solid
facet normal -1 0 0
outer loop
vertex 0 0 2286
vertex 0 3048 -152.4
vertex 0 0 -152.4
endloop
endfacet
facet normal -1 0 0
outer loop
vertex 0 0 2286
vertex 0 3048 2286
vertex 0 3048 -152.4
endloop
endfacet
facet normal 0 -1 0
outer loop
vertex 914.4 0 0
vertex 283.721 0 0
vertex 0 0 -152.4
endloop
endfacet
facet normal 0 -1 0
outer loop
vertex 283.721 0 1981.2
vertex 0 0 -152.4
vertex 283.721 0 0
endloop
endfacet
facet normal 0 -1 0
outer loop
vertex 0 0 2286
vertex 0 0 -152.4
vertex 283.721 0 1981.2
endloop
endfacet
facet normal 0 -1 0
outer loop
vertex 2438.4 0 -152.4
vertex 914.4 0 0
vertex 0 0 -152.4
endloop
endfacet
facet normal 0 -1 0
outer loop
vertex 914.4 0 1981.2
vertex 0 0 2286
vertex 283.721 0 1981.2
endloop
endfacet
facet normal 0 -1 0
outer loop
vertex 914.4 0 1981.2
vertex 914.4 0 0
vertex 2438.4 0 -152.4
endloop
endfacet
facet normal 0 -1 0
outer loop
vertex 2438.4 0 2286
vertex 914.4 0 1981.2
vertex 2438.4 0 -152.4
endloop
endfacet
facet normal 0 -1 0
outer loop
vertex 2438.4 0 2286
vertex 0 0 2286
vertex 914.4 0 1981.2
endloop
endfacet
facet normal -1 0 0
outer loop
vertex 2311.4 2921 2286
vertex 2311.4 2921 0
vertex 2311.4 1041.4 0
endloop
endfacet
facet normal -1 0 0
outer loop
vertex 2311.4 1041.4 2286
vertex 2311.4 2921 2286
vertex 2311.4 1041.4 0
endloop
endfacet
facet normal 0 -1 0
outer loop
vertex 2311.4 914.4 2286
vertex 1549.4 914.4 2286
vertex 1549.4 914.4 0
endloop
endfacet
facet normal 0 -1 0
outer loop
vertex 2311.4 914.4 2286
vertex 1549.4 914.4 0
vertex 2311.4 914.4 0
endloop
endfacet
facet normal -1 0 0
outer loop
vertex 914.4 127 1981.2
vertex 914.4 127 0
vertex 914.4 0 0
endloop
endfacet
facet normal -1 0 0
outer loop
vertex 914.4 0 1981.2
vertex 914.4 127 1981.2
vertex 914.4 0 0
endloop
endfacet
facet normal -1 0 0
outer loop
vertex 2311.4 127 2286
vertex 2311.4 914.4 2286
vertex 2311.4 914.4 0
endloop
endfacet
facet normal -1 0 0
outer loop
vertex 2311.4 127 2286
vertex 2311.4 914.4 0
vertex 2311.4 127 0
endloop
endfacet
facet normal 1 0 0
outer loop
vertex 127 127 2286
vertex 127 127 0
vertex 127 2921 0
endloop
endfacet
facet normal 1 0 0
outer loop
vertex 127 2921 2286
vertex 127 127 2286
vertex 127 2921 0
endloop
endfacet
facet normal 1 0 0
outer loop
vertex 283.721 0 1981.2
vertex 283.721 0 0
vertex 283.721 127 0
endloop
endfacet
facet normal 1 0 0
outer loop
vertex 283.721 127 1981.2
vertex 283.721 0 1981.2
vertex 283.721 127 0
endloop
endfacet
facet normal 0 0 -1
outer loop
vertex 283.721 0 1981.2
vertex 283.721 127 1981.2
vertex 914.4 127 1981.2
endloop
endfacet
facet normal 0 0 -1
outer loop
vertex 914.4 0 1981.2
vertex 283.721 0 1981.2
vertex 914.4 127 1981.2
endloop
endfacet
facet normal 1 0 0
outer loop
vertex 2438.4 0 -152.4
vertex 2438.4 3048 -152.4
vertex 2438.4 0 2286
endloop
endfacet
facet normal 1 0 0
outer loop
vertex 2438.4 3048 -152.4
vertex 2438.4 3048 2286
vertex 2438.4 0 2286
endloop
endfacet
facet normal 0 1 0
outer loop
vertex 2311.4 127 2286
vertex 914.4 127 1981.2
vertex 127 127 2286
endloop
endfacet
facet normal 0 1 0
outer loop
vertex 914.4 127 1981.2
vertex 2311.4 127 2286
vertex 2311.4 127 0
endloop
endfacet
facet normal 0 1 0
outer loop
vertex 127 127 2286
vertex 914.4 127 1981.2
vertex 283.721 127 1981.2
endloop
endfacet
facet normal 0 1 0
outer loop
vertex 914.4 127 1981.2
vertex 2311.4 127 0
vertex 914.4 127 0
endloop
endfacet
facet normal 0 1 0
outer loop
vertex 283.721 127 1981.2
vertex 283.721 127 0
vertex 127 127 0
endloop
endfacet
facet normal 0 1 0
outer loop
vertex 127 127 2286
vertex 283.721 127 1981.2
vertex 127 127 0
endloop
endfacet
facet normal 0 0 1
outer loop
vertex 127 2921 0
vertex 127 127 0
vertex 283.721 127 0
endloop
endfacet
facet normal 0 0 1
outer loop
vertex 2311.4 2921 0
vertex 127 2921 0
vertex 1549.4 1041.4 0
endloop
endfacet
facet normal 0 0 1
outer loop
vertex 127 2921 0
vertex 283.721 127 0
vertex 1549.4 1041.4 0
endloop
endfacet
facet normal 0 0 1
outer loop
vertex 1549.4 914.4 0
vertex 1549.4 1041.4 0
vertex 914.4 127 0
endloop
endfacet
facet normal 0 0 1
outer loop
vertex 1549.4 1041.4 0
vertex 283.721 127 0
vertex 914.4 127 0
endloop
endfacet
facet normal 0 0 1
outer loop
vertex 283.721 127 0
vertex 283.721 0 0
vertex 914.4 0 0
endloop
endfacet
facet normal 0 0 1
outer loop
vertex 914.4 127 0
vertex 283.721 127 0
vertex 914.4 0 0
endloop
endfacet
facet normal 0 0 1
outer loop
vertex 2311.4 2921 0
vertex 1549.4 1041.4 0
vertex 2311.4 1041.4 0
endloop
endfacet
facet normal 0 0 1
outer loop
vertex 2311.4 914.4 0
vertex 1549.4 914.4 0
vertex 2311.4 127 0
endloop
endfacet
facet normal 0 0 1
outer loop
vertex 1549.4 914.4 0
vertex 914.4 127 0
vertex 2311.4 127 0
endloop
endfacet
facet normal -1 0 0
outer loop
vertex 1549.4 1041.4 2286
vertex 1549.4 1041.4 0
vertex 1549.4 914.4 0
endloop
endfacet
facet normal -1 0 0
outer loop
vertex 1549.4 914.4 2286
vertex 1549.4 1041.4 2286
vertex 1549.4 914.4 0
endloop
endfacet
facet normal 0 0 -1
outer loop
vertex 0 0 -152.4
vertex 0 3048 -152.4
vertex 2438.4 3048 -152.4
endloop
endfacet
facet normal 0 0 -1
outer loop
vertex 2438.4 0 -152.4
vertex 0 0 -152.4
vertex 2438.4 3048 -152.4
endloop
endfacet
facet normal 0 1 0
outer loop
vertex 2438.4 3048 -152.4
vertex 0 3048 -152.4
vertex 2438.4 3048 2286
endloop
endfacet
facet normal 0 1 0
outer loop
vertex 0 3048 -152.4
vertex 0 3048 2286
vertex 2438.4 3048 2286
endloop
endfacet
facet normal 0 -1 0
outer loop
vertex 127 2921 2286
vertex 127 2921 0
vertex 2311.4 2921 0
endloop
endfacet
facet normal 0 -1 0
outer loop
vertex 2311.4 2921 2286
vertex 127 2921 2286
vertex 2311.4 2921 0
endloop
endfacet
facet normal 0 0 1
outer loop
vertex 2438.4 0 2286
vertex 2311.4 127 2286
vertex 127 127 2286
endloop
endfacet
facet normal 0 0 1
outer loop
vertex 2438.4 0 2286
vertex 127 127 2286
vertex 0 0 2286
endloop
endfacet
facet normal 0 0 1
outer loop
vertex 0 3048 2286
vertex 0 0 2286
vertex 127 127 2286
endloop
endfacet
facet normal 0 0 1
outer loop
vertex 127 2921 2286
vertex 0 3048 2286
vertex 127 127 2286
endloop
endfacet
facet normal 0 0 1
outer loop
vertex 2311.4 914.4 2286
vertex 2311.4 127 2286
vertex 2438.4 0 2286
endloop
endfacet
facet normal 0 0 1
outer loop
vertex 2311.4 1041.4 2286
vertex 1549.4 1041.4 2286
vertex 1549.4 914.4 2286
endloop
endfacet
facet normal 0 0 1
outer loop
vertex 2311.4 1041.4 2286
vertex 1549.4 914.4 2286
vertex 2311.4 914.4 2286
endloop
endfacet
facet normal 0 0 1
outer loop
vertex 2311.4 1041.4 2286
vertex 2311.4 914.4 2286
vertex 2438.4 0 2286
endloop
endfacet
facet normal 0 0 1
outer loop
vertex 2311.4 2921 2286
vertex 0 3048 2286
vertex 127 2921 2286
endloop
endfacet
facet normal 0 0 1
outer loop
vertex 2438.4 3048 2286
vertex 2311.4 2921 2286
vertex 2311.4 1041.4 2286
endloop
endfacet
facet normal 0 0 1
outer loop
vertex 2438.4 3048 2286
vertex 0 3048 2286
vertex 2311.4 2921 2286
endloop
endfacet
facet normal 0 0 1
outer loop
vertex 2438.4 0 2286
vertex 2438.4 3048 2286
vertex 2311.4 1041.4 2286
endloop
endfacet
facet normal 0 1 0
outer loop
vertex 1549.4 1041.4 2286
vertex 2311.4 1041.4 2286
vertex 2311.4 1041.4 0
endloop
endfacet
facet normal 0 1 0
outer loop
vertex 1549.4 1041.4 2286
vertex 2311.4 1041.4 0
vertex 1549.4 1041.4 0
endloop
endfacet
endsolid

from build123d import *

# Parameters (mm, degrees)
F1_DEPTH = 2286
F2_W     = 2438.4
F2_H     = 3048
F3_DEPTH = 152.4
F4_W     = 840.340228
F4_H     = 127
F5_DEPTH = 304.8


with BuildPart() as f1:
    # F0 (on Top) → F1 (new body)
    with BuildSketch(Plane.XY):
        Polygon((0, 3048), (0, 0), (283.721119, 0), (283.721119, 127), (127, 127), (127, 2921), (2311.4, 2921), (2311.4, 1041.4), (1549.4, 1041.4), (1549.4, 914.4), (2311.4, 914.4), (2311.4, 127), (914.4, 127), (914.4, 0), (2438.4, 0), (2438.4, 3048), align=None)
    extrude(amount=F1_DEPTH)

    # F2 (on face) → F3 (join)
    with BuildSketch(Plane(origin=(0, 0, 0), x_dir=(1, 0, 0), z_dir=(0, 0, -1))):
        with Locations((1219.2, -1524)):
            Rectangle(F2_W, F2_H)
    extrude(amount=F3_DEPTH)

    # F4 (on face) → F5 (join)
    with BuildSketch(Plane.XY.offset(2286)):
        with Locations((625.530674, 63.5)):
            Rectangle(F4_W, F4_H)
    extrude(amount=-F5_DEPTH)


solid = f1.part
